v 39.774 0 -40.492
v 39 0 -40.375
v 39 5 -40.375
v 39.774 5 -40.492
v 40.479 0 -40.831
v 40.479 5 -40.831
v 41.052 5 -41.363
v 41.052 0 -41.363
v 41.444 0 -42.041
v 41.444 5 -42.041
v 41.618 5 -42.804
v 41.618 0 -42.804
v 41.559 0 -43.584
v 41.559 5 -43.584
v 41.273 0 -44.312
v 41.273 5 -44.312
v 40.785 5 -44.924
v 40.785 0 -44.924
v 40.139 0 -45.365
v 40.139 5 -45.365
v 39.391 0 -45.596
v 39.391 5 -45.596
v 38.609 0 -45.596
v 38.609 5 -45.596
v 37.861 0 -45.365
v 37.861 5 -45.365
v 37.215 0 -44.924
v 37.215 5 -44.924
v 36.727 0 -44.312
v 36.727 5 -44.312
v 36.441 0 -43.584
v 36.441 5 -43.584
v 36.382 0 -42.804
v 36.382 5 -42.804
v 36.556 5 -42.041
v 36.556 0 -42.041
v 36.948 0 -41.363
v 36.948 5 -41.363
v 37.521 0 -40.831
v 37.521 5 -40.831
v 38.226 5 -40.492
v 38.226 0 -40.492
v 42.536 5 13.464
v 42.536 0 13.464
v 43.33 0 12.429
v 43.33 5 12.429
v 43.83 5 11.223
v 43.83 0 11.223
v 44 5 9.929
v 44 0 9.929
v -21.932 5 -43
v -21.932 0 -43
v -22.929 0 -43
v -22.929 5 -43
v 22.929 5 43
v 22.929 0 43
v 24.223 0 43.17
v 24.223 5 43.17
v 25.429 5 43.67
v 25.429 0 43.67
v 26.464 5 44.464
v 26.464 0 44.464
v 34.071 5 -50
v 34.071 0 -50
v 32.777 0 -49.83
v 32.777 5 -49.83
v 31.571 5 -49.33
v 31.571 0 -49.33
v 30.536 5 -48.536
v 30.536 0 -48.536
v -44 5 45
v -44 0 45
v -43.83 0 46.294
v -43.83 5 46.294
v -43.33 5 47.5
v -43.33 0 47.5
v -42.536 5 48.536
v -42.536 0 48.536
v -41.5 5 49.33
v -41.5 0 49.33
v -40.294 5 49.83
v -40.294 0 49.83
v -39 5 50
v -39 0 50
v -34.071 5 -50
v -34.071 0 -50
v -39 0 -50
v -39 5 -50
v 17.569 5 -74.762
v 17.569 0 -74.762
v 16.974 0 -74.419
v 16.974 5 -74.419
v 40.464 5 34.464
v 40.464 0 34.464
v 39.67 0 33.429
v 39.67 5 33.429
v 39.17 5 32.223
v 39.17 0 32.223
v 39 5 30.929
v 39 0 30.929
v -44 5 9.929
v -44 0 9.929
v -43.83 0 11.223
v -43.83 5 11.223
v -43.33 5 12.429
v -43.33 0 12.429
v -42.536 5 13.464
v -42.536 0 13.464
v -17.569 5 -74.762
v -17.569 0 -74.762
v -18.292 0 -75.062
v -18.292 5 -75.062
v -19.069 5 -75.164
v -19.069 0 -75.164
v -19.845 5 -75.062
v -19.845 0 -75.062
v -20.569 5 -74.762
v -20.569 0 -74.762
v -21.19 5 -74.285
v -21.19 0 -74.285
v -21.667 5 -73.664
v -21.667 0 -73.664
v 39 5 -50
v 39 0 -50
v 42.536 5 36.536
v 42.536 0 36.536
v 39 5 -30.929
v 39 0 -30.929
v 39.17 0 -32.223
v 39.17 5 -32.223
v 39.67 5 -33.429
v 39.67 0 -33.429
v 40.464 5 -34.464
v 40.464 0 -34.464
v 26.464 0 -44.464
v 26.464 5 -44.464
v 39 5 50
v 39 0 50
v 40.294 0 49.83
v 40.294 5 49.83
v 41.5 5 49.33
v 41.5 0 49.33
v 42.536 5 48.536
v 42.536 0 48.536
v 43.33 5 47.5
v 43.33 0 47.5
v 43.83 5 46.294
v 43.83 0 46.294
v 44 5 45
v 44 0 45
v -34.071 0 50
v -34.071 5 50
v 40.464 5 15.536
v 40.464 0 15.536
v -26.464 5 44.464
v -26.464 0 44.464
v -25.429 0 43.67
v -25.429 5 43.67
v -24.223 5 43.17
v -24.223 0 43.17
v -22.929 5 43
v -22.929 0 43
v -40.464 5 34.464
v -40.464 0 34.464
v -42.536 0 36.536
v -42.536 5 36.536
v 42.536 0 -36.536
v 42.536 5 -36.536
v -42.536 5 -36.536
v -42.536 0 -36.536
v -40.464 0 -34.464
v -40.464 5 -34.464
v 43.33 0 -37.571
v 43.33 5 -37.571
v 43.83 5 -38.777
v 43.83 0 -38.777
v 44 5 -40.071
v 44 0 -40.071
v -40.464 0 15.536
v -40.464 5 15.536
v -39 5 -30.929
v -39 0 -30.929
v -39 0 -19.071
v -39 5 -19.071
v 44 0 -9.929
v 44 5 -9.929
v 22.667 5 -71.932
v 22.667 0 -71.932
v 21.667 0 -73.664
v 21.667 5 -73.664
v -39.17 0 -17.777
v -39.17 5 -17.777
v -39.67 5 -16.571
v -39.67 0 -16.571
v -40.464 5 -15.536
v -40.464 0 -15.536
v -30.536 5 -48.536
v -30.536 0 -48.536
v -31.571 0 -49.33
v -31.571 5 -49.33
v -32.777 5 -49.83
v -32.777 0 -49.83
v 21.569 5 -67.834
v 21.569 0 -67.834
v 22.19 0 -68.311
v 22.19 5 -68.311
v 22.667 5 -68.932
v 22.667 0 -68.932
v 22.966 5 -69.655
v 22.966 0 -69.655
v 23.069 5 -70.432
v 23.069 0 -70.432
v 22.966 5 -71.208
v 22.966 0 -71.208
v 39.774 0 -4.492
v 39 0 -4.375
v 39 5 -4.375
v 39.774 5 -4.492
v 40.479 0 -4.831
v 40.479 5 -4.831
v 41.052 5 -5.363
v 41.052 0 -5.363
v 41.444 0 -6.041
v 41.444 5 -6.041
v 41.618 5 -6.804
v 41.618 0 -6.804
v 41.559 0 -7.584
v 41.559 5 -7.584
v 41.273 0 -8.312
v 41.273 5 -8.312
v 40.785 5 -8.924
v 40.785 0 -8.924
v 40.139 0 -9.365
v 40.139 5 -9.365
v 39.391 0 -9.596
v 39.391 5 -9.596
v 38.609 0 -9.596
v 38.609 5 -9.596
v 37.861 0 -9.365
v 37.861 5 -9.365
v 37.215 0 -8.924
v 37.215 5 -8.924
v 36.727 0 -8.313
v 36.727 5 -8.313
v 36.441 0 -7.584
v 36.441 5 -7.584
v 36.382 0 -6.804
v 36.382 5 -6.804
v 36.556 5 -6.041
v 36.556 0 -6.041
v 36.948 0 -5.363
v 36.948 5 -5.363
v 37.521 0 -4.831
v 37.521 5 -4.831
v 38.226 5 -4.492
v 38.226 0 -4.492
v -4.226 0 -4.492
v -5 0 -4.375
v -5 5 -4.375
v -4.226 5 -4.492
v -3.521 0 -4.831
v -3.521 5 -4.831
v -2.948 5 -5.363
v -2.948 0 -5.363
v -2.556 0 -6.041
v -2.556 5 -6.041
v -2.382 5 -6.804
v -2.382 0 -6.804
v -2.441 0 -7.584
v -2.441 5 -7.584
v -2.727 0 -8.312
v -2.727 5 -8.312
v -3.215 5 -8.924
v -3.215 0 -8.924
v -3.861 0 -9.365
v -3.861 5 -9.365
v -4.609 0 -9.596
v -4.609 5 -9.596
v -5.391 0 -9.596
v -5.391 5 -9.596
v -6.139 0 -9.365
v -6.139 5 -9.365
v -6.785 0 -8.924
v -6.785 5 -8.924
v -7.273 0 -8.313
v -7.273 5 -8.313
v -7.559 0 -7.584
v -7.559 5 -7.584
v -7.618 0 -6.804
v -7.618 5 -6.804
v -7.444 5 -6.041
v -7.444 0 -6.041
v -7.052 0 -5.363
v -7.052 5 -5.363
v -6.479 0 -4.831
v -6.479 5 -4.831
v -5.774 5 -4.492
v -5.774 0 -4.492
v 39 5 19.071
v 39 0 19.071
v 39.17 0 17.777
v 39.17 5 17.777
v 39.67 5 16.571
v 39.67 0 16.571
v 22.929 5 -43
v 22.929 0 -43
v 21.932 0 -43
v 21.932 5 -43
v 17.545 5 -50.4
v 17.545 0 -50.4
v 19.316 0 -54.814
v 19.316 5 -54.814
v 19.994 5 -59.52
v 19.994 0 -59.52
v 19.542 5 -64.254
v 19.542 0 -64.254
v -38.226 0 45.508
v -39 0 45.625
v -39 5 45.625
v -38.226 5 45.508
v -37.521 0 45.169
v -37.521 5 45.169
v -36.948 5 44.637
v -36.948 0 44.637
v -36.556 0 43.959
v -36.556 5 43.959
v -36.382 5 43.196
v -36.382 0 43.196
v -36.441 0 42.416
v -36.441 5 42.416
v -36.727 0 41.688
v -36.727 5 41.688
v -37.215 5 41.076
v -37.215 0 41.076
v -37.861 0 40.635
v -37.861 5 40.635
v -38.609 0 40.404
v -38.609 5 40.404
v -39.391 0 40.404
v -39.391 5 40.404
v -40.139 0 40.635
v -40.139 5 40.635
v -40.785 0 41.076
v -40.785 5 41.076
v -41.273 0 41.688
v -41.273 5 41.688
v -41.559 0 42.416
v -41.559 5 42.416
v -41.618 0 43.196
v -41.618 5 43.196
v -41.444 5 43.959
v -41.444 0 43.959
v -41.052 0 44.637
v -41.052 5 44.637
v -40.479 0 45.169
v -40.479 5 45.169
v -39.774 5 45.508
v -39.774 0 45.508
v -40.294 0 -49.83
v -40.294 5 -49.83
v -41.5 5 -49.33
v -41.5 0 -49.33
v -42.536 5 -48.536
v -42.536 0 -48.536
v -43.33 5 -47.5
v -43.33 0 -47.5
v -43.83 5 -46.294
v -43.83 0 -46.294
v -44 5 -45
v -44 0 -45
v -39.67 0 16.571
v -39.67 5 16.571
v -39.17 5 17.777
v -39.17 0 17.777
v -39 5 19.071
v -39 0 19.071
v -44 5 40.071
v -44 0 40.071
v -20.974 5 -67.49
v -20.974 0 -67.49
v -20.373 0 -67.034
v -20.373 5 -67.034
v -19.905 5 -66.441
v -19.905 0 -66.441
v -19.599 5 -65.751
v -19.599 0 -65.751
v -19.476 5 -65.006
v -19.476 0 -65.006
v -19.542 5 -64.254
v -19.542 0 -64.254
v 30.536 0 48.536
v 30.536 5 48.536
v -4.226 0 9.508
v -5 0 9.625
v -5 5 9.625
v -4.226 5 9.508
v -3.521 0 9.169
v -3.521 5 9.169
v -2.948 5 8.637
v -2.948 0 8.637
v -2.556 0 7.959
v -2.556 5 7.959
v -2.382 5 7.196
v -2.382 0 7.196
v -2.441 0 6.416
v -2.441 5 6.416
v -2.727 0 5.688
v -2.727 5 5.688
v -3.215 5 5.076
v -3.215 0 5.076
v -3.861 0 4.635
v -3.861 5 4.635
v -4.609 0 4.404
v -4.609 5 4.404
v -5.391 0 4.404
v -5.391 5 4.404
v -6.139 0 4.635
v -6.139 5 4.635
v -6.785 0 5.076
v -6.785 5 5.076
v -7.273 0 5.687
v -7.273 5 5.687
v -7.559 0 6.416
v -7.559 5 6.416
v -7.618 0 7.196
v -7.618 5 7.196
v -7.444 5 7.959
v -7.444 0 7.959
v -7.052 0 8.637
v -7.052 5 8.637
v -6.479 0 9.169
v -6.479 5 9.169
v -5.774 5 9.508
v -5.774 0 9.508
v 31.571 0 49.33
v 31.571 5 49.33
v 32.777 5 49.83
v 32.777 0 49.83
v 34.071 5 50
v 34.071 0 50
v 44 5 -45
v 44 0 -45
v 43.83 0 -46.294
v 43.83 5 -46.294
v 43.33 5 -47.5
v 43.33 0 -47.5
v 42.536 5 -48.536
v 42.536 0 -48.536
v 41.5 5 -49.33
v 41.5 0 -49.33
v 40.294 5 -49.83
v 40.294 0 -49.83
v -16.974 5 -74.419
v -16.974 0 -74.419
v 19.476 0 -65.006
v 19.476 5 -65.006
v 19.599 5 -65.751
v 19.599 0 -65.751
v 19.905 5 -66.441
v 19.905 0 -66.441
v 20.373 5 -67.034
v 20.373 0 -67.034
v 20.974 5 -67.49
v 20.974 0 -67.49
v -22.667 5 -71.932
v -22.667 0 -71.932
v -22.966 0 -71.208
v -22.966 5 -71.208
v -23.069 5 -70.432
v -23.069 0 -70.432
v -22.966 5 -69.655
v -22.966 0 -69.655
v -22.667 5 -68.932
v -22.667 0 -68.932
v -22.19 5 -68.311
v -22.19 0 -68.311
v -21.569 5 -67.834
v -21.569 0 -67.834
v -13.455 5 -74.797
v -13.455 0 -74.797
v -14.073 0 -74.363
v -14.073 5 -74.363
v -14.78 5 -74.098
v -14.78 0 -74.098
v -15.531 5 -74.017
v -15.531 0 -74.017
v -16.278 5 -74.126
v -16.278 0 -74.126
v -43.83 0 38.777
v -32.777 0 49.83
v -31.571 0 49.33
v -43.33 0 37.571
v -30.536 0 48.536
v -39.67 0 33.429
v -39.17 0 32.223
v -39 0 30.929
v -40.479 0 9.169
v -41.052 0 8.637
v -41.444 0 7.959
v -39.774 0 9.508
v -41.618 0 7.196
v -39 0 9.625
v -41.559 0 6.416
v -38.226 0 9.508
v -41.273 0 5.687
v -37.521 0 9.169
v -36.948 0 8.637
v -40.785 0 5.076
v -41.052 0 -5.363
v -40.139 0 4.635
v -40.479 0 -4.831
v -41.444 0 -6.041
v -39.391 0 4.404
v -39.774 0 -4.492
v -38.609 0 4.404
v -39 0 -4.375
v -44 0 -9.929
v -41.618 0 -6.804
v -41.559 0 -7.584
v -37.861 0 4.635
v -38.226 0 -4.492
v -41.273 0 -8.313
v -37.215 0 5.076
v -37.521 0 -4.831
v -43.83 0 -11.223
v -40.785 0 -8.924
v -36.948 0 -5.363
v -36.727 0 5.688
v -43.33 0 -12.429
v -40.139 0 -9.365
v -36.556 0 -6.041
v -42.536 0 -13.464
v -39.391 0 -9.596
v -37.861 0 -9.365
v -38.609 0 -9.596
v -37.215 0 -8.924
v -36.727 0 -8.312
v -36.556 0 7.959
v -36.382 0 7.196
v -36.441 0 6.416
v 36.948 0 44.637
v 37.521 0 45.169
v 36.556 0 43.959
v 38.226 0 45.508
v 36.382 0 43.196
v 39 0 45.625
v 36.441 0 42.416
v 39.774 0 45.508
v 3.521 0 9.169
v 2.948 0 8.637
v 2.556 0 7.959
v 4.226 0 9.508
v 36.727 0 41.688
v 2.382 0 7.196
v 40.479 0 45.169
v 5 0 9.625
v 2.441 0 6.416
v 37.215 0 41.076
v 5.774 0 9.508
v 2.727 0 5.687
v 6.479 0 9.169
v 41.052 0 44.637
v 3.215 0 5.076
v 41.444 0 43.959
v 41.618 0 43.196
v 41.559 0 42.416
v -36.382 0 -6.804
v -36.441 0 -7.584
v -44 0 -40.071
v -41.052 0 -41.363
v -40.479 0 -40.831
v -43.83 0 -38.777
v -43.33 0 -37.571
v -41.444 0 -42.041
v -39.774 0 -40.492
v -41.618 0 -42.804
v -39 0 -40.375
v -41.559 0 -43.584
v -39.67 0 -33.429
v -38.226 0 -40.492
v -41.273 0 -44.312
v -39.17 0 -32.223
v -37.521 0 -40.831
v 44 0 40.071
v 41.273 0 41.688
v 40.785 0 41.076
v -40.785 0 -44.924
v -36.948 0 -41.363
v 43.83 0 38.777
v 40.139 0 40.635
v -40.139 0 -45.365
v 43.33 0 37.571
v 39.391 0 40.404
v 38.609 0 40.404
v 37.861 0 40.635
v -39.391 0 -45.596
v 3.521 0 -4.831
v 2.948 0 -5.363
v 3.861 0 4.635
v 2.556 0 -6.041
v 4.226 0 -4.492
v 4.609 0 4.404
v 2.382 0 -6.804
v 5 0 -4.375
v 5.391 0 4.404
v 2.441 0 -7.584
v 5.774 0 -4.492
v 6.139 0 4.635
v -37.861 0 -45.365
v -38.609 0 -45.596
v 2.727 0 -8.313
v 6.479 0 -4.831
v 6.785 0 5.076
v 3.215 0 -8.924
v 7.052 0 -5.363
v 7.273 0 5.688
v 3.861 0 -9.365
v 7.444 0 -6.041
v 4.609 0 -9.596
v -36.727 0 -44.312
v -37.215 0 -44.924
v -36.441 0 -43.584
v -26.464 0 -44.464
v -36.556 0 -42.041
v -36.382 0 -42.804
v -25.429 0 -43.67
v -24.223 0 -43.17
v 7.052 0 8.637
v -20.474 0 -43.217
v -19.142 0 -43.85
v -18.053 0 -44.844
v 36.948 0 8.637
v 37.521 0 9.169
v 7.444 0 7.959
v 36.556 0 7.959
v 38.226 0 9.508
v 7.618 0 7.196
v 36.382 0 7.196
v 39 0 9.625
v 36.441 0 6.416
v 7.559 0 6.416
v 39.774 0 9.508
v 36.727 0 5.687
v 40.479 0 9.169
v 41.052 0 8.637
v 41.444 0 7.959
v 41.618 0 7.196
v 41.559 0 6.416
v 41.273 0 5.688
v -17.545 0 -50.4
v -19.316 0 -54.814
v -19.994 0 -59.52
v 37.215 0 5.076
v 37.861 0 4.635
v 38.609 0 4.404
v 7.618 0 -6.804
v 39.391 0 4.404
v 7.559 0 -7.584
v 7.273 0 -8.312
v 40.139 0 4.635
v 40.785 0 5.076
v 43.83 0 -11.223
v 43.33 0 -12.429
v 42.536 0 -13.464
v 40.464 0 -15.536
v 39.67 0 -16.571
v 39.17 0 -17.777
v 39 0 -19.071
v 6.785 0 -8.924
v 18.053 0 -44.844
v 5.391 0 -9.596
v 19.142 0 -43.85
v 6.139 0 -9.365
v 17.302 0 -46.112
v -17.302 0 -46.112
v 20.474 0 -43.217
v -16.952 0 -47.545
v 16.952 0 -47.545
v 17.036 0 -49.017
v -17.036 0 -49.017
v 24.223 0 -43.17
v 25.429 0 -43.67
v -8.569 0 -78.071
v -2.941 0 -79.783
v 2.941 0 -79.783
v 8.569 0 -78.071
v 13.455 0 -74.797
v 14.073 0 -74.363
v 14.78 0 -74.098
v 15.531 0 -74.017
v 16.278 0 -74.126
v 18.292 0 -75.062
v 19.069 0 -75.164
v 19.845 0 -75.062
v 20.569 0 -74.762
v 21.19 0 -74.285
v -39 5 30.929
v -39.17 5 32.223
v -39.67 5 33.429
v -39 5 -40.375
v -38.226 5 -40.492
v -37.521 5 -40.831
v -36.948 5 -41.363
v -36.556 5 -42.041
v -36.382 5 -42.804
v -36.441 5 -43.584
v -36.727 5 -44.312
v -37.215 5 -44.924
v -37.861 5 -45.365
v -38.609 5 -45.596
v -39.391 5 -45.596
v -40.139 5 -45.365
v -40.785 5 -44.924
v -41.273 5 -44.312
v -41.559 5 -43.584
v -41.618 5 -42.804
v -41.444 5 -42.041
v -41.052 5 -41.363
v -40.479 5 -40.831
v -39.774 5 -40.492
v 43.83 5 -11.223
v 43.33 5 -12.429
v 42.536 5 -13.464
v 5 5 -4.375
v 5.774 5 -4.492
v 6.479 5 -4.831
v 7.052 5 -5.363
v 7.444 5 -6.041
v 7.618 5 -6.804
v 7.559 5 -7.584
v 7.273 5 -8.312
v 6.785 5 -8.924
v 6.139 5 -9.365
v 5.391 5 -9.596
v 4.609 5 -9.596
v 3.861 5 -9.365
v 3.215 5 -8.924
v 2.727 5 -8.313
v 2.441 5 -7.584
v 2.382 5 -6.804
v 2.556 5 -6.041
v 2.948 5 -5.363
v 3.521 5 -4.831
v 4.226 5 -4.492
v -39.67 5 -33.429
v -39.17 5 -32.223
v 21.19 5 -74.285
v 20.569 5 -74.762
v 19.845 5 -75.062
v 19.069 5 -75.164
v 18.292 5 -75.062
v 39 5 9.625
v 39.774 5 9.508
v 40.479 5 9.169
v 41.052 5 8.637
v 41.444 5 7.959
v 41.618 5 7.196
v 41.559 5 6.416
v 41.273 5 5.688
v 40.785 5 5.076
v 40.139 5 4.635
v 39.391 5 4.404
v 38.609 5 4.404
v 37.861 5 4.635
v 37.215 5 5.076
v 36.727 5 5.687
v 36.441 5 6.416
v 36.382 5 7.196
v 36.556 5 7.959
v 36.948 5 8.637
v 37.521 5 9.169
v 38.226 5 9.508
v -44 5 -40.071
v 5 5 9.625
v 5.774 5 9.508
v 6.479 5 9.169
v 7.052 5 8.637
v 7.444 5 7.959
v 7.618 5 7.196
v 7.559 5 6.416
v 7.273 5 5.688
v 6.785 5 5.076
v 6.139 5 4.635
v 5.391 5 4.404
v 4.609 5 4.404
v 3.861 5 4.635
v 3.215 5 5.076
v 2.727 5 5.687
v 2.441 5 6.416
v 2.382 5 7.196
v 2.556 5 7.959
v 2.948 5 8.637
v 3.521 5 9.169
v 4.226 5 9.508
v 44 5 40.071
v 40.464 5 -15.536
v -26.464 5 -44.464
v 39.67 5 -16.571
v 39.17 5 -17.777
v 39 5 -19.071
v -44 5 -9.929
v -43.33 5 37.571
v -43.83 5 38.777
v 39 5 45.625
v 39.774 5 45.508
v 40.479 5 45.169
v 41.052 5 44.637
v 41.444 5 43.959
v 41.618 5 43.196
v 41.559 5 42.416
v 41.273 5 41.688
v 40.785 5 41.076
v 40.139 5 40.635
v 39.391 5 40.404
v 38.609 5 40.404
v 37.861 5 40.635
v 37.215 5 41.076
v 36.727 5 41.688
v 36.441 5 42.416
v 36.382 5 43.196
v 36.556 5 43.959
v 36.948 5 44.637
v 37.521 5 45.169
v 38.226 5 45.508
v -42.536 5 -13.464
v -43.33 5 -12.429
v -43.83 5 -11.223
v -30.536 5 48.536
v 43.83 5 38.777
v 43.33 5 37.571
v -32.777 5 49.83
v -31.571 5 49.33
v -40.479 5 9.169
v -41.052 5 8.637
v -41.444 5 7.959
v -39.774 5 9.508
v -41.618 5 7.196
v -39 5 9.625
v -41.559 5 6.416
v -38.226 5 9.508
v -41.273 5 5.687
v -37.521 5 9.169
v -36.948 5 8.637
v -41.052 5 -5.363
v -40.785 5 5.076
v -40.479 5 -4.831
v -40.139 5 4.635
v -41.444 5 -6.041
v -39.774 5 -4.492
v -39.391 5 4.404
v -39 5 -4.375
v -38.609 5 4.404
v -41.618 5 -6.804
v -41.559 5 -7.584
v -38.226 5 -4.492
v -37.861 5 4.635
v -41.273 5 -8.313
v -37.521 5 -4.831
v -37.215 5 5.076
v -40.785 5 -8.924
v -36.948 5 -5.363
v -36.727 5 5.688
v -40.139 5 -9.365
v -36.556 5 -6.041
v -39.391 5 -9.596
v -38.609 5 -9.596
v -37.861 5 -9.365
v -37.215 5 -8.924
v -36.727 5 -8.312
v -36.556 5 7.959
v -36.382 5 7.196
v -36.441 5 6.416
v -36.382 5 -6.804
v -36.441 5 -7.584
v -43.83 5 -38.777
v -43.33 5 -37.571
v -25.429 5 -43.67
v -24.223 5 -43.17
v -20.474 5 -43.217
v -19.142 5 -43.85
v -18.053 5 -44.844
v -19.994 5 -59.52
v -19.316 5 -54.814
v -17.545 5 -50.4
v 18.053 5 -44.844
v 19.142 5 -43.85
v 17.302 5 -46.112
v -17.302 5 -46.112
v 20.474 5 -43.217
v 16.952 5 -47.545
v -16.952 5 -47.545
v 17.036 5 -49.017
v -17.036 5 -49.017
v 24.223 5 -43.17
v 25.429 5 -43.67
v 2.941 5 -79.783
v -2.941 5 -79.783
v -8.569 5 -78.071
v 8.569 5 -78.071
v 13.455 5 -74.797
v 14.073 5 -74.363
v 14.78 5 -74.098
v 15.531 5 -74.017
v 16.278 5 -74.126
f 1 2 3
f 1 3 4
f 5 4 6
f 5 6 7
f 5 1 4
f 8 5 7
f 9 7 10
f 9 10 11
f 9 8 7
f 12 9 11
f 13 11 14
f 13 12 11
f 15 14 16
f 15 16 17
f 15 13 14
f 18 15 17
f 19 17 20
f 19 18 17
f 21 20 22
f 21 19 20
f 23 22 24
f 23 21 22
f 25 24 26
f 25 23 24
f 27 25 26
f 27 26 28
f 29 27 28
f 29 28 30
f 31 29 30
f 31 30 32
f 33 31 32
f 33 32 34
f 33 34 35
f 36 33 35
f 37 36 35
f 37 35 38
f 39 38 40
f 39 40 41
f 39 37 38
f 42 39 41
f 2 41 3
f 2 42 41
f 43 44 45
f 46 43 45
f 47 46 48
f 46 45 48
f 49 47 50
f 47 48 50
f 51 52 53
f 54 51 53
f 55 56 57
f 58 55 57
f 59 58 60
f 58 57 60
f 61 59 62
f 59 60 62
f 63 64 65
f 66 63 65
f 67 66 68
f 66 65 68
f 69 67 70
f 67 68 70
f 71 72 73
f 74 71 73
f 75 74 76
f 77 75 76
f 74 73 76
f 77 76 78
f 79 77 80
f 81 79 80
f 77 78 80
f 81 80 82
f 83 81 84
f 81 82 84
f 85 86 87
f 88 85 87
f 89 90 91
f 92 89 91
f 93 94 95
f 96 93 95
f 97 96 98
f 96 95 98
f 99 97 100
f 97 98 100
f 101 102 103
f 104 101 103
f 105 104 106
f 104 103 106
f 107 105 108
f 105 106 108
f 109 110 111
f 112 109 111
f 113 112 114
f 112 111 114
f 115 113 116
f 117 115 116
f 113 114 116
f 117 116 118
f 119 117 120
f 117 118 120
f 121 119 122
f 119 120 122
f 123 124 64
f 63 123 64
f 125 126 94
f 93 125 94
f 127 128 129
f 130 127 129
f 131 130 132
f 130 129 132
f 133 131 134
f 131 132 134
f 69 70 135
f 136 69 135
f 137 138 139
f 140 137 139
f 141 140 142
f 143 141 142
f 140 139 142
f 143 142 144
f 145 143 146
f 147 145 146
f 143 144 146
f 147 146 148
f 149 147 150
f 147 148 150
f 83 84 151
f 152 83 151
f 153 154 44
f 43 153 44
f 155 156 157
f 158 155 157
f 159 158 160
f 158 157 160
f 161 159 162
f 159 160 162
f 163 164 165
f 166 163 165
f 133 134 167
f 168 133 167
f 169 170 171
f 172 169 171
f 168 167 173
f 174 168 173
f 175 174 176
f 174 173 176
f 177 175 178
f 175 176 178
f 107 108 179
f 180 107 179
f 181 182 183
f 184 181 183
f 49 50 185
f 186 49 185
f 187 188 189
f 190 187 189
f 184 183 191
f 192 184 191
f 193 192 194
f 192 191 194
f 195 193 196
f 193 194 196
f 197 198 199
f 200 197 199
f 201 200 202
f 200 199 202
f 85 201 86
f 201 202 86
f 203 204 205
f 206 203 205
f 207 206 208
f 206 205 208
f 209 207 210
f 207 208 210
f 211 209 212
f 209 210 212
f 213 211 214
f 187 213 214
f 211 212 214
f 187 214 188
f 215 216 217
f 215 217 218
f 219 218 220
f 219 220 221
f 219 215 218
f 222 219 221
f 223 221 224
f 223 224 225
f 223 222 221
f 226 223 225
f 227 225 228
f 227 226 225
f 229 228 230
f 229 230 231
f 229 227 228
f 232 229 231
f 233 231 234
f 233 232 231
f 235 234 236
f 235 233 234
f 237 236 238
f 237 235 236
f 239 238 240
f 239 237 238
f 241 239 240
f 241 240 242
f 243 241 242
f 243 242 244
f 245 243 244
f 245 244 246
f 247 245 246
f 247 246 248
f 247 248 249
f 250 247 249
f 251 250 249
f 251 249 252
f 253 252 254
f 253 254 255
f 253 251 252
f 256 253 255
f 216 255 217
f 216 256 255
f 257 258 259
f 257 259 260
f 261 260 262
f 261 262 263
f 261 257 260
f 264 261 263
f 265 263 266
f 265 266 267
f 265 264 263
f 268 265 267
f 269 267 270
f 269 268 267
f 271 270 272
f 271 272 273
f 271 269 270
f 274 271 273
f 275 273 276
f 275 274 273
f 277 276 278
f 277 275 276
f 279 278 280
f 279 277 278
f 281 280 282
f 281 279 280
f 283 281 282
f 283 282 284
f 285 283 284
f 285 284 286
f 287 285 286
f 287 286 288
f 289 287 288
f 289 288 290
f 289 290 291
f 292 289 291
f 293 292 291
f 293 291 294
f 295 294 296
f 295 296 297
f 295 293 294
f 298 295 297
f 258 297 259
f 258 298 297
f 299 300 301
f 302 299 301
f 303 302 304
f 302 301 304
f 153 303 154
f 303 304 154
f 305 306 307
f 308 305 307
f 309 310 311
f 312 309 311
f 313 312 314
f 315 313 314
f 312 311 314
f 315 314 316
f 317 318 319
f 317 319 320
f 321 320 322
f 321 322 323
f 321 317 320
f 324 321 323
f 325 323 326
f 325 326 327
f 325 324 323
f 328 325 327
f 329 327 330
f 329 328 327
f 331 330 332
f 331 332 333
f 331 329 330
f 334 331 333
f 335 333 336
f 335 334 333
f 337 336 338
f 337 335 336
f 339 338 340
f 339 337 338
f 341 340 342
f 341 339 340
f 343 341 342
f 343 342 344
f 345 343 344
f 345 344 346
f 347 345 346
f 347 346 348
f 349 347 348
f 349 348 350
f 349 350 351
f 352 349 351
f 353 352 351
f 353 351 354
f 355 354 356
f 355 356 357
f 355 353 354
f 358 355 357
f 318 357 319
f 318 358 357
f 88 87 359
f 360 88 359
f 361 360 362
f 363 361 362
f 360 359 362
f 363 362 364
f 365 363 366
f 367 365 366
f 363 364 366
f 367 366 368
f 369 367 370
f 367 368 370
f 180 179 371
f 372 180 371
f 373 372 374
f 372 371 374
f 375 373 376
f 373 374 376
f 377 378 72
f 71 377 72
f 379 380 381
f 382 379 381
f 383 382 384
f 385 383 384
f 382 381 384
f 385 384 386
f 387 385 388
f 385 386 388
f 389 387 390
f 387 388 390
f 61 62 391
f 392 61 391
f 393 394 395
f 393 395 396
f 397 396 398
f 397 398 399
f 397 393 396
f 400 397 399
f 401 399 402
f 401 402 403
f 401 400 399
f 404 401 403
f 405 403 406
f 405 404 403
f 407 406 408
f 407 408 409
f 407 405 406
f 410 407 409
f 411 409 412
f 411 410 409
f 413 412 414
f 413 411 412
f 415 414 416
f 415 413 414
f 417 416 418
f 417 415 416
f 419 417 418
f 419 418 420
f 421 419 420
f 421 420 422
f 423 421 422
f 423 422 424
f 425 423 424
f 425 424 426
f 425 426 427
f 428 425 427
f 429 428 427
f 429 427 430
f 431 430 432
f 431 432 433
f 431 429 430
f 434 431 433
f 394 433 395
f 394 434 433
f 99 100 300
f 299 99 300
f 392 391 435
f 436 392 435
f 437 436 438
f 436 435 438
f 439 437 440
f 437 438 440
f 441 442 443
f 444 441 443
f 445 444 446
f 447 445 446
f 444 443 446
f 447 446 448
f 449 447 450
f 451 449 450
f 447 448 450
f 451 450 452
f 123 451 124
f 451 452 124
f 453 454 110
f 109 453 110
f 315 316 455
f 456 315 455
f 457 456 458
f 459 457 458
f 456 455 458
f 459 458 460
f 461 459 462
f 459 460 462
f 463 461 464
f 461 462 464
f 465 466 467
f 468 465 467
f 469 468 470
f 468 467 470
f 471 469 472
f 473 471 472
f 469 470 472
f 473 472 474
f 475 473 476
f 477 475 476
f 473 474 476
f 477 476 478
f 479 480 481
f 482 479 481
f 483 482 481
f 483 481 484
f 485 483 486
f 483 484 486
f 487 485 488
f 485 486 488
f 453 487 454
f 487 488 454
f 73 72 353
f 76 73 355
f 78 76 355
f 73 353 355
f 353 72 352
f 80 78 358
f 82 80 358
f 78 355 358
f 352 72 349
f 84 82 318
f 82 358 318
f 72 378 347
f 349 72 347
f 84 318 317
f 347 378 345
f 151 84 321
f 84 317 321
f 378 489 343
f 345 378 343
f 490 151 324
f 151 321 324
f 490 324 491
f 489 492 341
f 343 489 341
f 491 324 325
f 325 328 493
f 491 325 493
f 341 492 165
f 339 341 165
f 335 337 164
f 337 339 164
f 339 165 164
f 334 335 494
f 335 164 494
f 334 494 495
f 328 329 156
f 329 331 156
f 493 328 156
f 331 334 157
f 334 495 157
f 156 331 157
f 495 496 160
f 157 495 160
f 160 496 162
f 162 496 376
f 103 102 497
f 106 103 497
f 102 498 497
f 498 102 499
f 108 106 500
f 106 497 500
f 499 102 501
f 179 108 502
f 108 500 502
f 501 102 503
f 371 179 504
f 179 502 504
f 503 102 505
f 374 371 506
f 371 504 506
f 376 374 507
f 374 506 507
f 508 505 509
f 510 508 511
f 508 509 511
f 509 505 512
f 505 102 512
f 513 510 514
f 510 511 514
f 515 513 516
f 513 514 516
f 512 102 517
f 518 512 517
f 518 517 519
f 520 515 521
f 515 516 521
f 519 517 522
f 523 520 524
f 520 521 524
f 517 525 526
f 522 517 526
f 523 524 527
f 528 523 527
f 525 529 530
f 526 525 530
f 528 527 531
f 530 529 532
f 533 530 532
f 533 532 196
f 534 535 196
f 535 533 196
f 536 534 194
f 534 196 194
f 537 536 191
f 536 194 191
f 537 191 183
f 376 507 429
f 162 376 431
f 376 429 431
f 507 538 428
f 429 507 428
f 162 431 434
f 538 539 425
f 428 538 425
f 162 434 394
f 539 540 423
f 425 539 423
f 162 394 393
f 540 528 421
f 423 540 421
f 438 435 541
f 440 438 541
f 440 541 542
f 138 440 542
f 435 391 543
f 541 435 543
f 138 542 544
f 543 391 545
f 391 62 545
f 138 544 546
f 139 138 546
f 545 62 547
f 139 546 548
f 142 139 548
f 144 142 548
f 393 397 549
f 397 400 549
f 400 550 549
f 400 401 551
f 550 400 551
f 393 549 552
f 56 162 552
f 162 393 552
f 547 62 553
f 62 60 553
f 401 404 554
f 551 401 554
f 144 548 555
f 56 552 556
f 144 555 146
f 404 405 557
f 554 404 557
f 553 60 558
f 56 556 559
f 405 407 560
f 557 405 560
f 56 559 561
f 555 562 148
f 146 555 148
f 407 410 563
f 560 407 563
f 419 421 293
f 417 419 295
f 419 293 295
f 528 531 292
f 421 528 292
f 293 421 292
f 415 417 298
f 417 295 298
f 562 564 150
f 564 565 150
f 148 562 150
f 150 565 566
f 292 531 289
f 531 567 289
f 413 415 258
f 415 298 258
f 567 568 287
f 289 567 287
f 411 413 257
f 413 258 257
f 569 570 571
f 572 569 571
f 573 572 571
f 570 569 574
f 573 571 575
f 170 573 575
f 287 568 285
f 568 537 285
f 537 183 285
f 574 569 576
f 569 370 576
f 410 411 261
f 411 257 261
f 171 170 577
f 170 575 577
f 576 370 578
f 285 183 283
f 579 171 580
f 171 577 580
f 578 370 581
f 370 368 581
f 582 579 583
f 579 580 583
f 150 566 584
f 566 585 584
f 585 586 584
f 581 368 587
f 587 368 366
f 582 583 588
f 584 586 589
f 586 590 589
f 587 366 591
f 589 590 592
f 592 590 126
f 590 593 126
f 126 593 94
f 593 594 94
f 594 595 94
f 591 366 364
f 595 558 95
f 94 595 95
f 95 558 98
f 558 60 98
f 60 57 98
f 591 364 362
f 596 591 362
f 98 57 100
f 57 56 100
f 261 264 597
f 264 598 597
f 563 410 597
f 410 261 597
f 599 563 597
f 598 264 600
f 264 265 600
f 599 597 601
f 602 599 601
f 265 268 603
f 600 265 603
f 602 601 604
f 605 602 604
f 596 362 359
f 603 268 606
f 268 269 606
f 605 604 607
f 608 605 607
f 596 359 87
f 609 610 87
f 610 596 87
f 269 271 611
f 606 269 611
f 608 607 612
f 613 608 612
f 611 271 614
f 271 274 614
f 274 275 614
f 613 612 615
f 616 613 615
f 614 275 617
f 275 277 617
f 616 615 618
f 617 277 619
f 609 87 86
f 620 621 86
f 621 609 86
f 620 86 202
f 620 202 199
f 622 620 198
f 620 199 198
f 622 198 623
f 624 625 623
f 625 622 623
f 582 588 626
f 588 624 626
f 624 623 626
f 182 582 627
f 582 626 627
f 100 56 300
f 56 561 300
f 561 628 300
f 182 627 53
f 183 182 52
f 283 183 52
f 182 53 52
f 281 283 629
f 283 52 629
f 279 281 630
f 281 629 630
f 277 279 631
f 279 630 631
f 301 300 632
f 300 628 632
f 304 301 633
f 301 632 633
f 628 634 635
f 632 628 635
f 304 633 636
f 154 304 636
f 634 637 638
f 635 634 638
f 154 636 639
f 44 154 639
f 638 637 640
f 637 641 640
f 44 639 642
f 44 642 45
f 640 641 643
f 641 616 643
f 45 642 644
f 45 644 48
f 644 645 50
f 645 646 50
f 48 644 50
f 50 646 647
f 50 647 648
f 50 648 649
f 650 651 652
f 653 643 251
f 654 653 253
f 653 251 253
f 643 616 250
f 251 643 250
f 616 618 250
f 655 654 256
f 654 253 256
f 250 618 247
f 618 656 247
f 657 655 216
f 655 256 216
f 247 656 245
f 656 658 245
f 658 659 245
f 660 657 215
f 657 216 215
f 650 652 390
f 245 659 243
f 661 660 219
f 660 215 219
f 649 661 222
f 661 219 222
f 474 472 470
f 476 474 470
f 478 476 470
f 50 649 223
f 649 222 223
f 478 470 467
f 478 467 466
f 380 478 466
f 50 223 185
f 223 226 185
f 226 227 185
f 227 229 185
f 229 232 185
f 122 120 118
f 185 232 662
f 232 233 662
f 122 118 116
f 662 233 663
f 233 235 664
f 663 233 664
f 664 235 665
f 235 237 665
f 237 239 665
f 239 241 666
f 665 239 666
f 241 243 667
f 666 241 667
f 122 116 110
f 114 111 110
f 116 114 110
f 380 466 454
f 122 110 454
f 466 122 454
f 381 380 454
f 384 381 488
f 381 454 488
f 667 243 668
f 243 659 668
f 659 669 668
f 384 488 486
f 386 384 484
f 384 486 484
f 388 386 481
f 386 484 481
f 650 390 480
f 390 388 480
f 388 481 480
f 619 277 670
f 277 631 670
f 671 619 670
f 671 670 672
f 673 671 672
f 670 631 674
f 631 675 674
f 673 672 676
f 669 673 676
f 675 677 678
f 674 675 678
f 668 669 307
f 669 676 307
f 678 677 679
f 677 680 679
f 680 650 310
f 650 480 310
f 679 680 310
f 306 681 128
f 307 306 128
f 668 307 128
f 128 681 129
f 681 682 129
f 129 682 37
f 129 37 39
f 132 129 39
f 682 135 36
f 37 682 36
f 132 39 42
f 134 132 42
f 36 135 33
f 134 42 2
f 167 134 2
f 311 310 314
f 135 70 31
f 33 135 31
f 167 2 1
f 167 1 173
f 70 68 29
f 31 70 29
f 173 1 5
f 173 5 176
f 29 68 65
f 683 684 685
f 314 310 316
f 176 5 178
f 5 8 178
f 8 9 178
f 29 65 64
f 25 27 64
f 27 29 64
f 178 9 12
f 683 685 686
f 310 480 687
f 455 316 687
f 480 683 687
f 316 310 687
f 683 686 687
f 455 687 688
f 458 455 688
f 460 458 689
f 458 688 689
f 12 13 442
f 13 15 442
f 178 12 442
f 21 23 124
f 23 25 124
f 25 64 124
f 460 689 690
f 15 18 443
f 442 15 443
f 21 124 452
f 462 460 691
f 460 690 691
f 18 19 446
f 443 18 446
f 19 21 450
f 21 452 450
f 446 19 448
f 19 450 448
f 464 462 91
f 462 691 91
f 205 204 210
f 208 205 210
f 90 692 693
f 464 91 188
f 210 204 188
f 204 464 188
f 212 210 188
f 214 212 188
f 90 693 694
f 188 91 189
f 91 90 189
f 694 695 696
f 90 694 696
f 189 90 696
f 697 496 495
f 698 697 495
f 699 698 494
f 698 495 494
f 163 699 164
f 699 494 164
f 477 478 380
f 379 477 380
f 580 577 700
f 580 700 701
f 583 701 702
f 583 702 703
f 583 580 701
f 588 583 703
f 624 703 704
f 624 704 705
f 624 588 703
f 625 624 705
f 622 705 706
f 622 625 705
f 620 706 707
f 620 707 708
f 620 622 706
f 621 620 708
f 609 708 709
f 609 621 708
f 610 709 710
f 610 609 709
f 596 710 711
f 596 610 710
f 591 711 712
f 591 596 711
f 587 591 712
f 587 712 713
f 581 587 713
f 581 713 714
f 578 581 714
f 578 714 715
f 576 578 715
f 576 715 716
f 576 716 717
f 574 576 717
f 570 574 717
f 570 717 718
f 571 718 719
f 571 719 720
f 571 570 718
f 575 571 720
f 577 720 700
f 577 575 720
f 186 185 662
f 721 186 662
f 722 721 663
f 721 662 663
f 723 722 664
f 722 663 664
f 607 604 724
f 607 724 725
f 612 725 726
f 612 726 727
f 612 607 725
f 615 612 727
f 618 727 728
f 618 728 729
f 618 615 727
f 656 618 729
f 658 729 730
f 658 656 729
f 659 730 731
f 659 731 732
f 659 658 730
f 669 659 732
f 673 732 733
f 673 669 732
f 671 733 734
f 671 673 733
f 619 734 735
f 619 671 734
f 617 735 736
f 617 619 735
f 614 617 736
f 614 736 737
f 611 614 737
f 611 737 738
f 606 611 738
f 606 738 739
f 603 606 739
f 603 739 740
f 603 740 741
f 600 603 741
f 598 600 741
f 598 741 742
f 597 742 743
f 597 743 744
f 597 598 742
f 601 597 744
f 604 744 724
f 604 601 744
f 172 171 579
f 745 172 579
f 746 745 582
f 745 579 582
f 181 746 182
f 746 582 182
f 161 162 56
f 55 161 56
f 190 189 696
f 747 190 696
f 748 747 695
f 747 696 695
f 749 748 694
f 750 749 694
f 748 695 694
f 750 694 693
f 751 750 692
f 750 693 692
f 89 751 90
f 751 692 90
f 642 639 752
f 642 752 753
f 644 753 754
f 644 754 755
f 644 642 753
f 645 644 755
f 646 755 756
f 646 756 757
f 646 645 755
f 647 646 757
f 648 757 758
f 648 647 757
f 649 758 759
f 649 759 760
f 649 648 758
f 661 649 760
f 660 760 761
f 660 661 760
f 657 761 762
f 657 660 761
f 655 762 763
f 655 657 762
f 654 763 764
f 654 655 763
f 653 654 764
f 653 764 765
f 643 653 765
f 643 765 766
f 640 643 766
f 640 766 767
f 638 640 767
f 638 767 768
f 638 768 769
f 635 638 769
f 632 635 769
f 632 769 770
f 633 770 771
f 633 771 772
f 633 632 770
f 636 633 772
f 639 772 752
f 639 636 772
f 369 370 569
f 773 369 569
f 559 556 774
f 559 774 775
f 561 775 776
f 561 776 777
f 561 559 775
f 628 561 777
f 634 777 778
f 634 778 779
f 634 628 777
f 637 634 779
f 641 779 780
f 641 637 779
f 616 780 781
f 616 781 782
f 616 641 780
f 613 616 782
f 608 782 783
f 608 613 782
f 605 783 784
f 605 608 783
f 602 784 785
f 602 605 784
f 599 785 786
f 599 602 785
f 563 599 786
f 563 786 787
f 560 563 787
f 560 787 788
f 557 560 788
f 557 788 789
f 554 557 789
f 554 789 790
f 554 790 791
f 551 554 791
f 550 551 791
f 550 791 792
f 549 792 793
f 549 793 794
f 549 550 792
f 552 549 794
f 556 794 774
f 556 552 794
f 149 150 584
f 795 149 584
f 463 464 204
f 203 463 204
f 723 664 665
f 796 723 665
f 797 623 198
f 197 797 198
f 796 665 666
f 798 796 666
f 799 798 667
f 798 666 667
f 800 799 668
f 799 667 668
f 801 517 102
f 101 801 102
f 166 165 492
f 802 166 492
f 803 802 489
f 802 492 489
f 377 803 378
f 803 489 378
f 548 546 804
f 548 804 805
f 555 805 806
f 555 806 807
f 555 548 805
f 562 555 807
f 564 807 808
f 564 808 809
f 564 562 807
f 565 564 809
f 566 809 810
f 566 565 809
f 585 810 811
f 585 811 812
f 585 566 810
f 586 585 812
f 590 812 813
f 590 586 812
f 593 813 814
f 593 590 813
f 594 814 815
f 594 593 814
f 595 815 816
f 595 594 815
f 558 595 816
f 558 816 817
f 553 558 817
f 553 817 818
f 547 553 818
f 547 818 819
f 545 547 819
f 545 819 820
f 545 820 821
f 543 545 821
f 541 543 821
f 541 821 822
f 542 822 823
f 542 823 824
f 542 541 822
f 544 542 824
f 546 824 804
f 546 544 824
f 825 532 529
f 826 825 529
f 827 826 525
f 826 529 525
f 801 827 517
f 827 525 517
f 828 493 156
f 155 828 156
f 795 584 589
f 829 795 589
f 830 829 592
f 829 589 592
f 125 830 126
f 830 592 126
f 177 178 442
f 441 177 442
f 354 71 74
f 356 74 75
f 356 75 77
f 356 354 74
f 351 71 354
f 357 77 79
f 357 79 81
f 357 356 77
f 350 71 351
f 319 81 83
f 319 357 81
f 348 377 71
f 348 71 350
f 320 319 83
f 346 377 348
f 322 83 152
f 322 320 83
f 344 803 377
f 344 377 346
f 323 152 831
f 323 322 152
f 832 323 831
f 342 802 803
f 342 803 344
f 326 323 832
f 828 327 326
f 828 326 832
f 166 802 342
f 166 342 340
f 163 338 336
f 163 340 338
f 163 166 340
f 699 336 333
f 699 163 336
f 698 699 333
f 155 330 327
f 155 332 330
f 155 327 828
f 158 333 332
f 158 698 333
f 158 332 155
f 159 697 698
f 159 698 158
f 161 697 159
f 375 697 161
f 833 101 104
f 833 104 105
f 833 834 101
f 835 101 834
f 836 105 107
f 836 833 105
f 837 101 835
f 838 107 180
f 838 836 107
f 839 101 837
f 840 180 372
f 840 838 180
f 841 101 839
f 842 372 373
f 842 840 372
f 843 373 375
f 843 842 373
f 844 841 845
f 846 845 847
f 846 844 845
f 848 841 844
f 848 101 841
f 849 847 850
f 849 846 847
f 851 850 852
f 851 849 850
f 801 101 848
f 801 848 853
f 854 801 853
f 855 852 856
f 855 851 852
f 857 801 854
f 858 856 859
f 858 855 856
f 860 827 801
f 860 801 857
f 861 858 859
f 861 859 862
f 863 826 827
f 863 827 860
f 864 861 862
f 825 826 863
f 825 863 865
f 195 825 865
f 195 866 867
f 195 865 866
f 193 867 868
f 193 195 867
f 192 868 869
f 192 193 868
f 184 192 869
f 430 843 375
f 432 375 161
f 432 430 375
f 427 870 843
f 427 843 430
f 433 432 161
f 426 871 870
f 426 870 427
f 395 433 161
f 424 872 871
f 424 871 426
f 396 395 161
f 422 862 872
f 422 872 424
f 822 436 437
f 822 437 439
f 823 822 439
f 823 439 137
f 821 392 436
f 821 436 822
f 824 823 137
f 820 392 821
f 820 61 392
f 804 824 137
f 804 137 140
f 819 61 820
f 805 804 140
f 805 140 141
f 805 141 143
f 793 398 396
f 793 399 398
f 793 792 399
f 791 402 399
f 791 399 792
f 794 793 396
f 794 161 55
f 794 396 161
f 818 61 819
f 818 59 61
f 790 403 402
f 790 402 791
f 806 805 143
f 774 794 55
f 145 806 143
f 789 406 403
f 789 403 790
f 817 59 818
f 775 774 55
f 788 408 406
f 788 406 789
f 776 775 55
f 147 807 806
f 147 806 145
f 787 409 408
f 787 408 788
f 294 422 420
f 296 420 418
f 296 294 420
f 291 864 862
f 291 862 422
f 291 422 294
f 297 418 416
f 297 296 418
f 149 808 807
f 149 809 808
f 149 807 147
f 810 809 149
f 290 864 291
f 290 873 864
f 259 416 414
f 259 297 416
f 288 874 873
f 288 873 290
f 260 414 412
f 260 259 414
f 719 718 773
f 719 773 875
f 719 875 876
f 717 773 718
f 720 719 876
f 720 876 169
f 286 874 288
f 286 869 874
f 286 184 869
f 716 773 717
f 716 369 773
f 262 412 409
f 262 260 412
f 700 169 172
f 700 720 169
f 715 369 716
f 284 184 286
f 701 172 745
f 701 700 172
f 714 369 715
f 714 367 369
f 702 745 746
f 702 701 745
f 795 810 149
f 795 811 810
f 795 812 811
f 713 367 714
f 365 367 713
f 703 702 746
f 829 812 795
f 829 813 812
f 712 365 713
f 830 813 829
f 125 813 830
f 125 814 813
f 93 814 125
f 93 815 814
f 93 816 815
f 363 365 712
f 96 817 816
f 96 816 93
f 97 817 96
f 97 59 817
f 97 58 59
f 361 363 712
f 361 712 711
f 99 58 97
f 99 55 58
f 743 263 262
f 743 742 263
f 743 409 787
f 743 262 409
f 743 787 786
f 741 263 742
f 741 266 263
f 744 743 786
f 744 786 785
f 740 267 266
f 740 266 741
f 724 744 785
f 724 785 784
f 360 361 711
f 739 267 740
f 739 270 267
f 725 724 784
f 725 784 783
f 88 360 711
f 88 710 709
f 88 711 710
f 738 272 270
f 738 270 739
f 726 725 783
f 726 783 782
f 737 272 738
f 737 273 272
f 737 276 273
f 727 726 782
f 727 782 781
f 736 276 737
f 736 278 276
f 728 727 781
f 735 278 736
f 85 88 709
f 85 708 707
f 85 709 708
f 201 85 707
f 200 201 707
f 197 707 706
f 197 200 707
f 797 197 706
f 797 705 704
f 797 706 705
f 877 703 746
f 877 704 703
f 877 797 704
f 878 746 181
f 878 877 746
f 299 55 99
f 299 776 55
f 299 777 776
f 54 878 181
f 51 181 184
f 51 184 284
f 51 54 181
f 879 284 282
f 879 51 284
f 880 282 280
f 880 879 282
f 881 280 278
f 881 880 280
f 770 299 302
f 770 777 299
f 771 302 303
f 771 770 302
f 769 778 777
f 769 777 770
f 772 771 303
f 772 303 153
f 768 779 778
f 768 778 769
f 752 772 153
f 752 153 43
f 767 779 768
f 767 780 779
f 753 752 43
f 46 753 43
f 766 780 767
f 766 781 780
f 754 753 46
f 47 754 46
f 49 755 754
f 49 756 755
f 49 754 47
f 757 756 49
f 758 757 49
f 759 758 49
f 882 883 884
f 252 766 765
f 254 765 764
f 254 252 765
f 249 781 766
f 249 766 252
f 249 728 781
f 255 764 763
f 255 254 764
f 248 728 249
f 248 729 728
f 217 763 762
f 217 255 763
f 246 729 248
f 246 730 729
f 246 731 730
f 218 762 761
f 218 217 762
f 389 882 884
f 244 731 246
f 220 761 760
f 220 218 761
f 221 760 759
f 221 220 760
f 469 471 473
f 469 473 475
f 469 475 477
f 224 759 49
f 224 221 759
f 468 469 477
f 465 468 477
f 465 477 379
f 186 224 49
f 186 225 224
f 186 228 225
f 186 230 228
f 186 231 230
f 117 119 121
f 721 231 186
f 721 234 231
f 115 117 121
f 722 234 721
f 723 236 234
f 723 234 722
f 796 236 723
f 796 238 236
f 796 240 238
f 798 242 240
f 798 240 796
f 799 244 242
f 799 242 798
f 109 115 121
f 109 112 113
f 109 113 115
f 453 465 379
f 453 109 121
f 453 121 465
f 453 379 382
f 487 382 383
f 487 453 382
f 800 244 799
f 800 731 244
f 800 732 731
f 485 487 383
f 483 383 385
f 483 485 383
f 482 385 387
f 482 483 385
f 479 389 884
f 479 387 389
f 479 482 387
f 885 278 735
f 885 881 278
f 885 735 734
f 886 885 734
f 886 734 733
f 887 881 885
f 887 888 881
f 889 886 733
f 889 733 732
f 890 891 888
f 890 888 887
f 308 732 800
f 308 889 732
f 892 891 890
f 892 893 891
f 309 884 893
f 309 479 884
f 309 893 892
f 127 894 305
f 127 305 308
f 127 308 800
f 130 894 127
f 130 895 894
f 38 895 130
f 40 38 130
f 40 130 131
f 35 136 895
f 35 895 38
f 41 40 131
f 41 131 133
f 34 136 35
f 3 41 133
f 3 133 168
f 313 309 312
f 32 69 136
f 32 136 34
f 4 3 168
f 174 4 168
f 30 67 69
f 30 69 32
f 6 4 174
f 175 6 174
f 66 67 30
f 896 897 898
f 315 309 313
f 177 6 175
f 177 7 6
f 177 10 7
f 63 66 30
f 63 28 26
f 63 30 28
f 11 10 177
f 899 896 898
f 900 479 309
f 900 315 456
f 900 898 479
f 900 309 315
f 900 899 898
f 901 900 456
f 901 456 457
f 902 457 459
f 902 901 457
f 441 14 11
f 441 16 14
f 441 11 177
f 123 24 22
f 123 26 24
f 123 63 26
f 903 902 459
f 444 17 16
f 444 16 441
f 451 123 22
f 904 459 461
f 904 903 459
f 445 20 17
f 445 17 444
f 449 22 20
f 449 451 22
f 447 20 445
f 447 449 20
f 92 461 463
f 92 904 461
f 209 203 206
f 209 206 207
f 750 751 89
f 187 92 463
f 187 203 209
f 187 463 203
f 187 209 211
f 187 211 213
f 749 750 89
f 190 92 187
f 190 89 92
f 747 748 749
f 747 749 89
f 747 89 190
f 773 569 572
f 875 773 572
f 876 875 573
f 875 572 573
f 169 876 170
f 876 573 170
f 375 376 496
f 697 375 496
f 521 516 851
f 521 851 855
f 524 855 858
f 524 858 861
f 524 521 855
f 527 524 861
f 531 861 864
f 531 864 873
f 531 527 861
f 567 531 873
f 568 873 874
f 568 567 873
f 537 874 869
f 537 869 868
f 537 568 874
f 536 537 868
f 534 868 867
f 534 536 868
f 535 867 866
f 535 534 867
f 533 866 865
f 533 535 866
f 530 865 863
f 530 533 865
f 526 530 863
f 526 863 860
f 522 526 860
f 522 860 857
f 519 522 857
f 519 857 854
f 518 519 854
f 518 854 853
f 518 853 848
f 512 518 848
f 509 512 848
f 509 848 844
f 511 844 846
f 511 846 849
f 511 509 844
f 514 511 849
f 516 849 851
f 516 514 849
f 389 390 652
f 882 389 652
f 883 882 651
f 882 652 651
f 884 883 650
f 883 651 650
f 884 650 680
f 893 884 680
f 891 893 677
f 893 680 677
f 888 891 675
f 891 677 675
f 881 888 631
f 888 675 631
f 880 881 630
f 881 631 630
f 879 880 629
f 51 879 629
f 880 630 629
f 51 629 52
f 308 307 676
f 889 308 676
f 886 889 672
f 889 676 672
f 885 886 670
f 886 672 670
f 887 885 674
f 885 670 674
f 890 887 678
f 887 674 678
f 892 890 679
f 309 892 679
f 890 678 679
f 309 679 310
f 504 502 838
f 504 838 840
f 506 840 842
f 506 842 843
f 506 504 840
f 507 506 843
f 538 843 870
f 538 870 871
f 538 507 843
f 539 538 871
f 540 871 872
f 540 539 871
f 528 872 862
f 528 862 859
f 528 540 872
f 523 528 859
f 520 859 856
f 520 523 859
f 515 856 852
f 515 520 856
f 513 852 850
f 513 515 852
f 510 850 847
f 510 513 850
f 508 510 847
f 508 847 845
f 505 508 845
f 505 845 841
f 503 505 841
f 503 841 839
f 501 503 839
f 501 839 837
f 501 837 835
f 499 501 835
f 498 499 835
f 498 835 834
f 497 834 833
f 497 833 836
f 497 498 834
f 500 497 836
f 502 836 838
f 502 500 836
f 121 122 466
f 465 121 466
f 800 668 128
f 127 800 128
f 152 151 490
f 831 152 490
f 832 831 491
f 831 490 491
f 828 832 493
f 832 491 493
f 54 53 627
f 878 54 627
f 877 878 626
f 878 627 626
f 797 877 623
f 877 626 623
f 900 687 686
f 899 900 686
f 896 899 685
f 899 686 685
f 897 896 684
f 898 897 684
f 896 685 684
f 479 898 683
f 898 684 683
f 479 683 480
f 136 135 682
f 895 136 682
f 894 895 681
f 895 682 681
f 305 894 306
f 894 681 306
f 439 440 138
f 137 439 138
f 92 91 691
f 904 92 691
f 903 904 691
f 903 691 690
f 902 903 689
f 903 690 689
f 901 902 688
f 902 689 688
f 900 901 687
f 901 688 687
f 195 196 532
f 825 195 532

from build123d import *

# Parameters (mm, degrees)
SKETCH1_R           = 2.625
BOSS_EXTRUDE1_DEPTH = 5


with BuildPart() as part:
    # Sketch1 → Boss-Extrude1 (new body)
    with BuildSketch(Plane(origin=(0, 0, 0), x_dir=(1, 0, 0), z_dir=(0, 1, 0))):
        with BuildLine():
            Line((-42.535533906, 36.535533906), (-40.464466094, 34.464466094))
            ThreePointArc((-40.464466094, 34.464466094), (-39.380602337, 32.84234935), (-39, 30.928932188))
            Line((-39, 30.928932188), (-39, 19.071067812))
            ThreePointArc((-39, 19.071067812), (-39.380602337, 17.15765065), (-40.464466094, 15.535533906))
            Line((-40.464466094, 15.535533906), (-42.535533906, 13.464466094))
            ThreePointArc((-42.535533906, 13.464466094), (-43.619397663, 11.84234935), (-44, 9.928932188))
            Line((-44, 9.928932188), (-44, -9.928932188))
            ThreePointArc((-44, -9.928932188), (-43.619397663, -11.84234935), (-42.535533906, -13.464466094))
            Line((-42.535533906, -13.464466094), (-40.464466094, -15.535533906))
            ThreePointArc((-40.464466094, -15.535533906), (-39.380602337, -17.15765065), (-39, -19.071067812))
            Line((-39, -19.071067812), (-39, -30.928932188))
            ThreePointArc((-39, -30.928932188), (-39.380602337, -32.84234935), (-40.464466094, -34.464466094))
            Line((-40.464466094, -34.464466094), (-42.535533906, -36.535533906))
            ThreePointArc((-42.535533906, -36.535533906), (-43.619397663, -38.15765065), (-44, -40.071067812))
            Line((-44, -40.071067812), (-44, -45))
            ThreePointArc((-44, -45), (-42.535533906, -48.535533906), (-39, -50))
            Line((-39, -50), (-34.071067812, -50))
            ThreePointArc((-34.071067812, -50), (-32.15765065, -49.619397663), (-30.535533906, -48.535533906))
            Line((-30.535533906, -48.535533906), (-26.464466094, -44.464466094))
            ThreePointArc((-26.464466094, -44.464466094), (-24.84234935, -43.380602337), (-22.928932188, -43))
            Line((-22.928932188, -43), (22.928932188, -43))
            ThreePointArc((22.928932188, -43), (24.84234935, -43.380602337), (26.464466094, -44.464466094))
            Line((26.464466094, -44.464466094), (30.535533906, -48.535533906))
            ThreePointArc((30.535533906, -48.535533906), (32.15765065, -49.619397663), (34.071067812, -50))
            Line((34.071067812, -50), (39, -50))
            ThreePointArc((39, -50), (42.535533906, -48.535533906), (44, -45))
            Line((44, -45), (44, -40.071067812))
            ThreePointArc((44, -40.071067812), (43.619397663, -38.15765065), (42.535533906, -36.535533906))
            Line((42.535533906, -36.535533906), (40.464466094, -34.464466094))
            ThreePointArc((40.464466094, -34.464466094), (39.380602337, -32.84234935), (39, -30.928932188))
            Line((39, -30.928932188), (39, -19.071067812))
            ThreePointArc((39, -19.071067812), (39.380602337, -17.15765065), (40.464466094, -15.535533906))
            Line((40.464466094, -15.535533906), (42.535533906, -13.464466094))
            ThreePointArc((42.535533906, -13.464466094), (43.619397663, -11.84234935), (44, -9.928932188))
            Line((44, -9.928932188), (44, 9.928932188))
            ThreePointArc((44, 9.928932188), (43.619397663, 11.84234935), (42.535533906, 13.464466094))
            Line((42.535533906, 13.464466094), (40.464466094, 15.535533906))
            ThreePointArc((40.464466094, 15.535533906), (39.380602337, 17.15765065), (39, 19.071067812))
            Line((39, 19.071067812), (39, 30.928932188))
            ThreePointArc((39, 30.928932188), (39.380602337, 32.84234935), (40.464466094, 34.464466094))
            Line((40.464466094, 34.464466094), (42.535533906, 36.535533906))
            ThreePointArc((42.535533906, 36.535533906), (43.619397663, 38.15765065), (44, 40.071067812))
            Line((44, 40.071067812), (44, 45))
            ThreePointArc((44, 45), (42.535533906, 48.535533906), (39, 50))
            Line((39, 50), (34.071067812, 50))
            ThreePointArc((34.071067812, 50), (32.15765065, 49.619397663), (30.535533906, 48.535533906))
            Line((30.535533906, 48.535533906), (26.464466094, 44.464466094))
            ThreePointArc((26.464466094, 44.464466094), (24.84234935, 43.380602337), (22.928932188, 43))
            Line((22.928932188, 43), (21.931712199, 43))
            ThreePointArc((21.931712199, 43), (17.630549566, 45.450490243), (17.54536976, 50.4))
            ThreePointArc((17.54536976, 50.4), (19.795416719, 57.146672655), (19.542318227, 64.254150716))
            ThreePointArc((19.542318227, 64.254150716), (19.730044926, 66.105757405), (20.973665961, 67.490349535))
            Line((20.973665961, 67.490349535), (21.56863896, 67.833857356))
            ThreePointArc((21.56863896, 67.833857356), (22.966416439, 69.655476432), (22.666715171, 71.931933567))
            Line((22.666715171, 71.931933567), (21.666715171, 73.663984375))
            ThreePointArc((21.666715171, 73.663984375), (19.845096095, 75.061761854), (17.56863896, 74.762060586))
            Line((17.56863896, 74.762060586), (16.973665961, 74.418552765))
            ThreePointArc((16.973665961, 74.418552765), (15.152763485, 74.033841421), (13.455361705, 74.797068675))
            ThreePointArc((13.455361705, 74.797068675), (0, 80), (-13.455361705, 74.797068675))
            ThreePointArc((-13.455361705, 74.797068675), (-15.152763485, 74.033841421), (-16.973665961, 74.418552765))
            Line((-16.973665961, 74.418552765), (-17.56863896, 74.762060586))
            ThreePointArc((-17.56863896, 74.762060586), (-19.845096095, 75.061761854), (-21.666715171, 73.663984375))
            Line((-21.666715171, 73.663984375), (-22.666715171, 71.931933567))
            ThreePointArc((-22.666715171, 71.931933567), (-22.966416439, 69.655476432), (-21.56863896, 67.833857356))
            Line((-21.56863896, 67.833857356), (-20.973665961, 67.490349535))
            ThreePointArc((-20.973665961, 67.490349535), (-19.730044926, 66.105757405), (-19.542318227, 64.254150716))
            ThreePointArc((-19.542318227, 64.254150716), (-19.795416719, 57.146672655), (-17.54536976, 50.4))
            ThreePointArc((-17.54536976, 50.4), (-17.630549566, 45.450490243), (-21.931712199, 43))
            Line((-21.931712199, 43), (-22.928932188, 43))
            ThreePointArc((-22.928932188, 43), (-24.84234935, 43.380602337), (-26.464466094, 44.464466094))
            Line((-26.464466094, 44.464466094), (-30.535533906, 48.535533906))
            ThreePointArc((-30.535533906, 48.535533906), (-32.15765065, 49.619397663), (-34.071067812, 50))
            Line((-34.071067812, 50), (-39, 50))
            ThreePointArc((-39, 50), (-42.535533906, 48.535533906), (-44, 45))
            Line((-44, 45), (-44, 40.071067812))
            ThreePointArc((-44, 40.071067812), (-43.619397663, 38.15765065), (-42.535533906, 36.535533906))
        make_face()
        with Locations(Location((-39, 43, 0), (0, 0, 270))):
            Circle(SKETCH1_R, mode=Mode.SUBTRACT)
        with Locations(Location((-39, 7, 0), (0, 0, 270))):
            Circle(SKETCH1_R, mode=Mode.SUBTRACT)
        with Locations(Location((-39, -7, 0), (0, 0, 270))):
            Circle(SKETCH1_R, mode=Mode.SUBTRACT)
        with Locations(Location((-39, -43, 0), (0, 0, 270))):
            Circle(SKETCH1_R, mode=Mode.SUBTRACT)
        with Locations(Location((39, -43, 0), (0, 0, 270))):
            Circle(SKETCH1_R, mode=Mode.SUBTRACT)
        with Locations(Location((39, -7, 0), (0, 0, 270))):
            Circle(SKETCH1_R, mode=Mode.SUBTRACT)
        with Locations(Location((39, 7, 0), (0, 0, 270))):
            Circle(SKETCH1_R, mode=Mode.SUBTRACT)
        with Locations(Location((39, 43, 0), (0, 0, 270))):
            Circle(SKETCH1_R, mode=Mode.SUBTRACT)
        with Locations(Location((-5, 7, 0), (0, 0, 270))):
            Circle(SKETCH1_R, mode=Mode.SUBTRACT)
        with Locations(Location((5, 7, 0), (0, 0, 270))):
            Circle(SKETCH1_R, mode=Mode.SUBTRACT)
        with Locations(Location((5, -7, 0), (0, 0, 270))):
            Circle(SKETCH1_R, mode=Mode.SUBTRACT)
        with Locations(Location((-5, -7, 0), (0, 0, 270))):
            Circle(SKETCH1_R, mode=Mode.SUBTRACT)
    extrude(amount=BOSS_EXTRUDE1_DEPTH)


solid = part.part
